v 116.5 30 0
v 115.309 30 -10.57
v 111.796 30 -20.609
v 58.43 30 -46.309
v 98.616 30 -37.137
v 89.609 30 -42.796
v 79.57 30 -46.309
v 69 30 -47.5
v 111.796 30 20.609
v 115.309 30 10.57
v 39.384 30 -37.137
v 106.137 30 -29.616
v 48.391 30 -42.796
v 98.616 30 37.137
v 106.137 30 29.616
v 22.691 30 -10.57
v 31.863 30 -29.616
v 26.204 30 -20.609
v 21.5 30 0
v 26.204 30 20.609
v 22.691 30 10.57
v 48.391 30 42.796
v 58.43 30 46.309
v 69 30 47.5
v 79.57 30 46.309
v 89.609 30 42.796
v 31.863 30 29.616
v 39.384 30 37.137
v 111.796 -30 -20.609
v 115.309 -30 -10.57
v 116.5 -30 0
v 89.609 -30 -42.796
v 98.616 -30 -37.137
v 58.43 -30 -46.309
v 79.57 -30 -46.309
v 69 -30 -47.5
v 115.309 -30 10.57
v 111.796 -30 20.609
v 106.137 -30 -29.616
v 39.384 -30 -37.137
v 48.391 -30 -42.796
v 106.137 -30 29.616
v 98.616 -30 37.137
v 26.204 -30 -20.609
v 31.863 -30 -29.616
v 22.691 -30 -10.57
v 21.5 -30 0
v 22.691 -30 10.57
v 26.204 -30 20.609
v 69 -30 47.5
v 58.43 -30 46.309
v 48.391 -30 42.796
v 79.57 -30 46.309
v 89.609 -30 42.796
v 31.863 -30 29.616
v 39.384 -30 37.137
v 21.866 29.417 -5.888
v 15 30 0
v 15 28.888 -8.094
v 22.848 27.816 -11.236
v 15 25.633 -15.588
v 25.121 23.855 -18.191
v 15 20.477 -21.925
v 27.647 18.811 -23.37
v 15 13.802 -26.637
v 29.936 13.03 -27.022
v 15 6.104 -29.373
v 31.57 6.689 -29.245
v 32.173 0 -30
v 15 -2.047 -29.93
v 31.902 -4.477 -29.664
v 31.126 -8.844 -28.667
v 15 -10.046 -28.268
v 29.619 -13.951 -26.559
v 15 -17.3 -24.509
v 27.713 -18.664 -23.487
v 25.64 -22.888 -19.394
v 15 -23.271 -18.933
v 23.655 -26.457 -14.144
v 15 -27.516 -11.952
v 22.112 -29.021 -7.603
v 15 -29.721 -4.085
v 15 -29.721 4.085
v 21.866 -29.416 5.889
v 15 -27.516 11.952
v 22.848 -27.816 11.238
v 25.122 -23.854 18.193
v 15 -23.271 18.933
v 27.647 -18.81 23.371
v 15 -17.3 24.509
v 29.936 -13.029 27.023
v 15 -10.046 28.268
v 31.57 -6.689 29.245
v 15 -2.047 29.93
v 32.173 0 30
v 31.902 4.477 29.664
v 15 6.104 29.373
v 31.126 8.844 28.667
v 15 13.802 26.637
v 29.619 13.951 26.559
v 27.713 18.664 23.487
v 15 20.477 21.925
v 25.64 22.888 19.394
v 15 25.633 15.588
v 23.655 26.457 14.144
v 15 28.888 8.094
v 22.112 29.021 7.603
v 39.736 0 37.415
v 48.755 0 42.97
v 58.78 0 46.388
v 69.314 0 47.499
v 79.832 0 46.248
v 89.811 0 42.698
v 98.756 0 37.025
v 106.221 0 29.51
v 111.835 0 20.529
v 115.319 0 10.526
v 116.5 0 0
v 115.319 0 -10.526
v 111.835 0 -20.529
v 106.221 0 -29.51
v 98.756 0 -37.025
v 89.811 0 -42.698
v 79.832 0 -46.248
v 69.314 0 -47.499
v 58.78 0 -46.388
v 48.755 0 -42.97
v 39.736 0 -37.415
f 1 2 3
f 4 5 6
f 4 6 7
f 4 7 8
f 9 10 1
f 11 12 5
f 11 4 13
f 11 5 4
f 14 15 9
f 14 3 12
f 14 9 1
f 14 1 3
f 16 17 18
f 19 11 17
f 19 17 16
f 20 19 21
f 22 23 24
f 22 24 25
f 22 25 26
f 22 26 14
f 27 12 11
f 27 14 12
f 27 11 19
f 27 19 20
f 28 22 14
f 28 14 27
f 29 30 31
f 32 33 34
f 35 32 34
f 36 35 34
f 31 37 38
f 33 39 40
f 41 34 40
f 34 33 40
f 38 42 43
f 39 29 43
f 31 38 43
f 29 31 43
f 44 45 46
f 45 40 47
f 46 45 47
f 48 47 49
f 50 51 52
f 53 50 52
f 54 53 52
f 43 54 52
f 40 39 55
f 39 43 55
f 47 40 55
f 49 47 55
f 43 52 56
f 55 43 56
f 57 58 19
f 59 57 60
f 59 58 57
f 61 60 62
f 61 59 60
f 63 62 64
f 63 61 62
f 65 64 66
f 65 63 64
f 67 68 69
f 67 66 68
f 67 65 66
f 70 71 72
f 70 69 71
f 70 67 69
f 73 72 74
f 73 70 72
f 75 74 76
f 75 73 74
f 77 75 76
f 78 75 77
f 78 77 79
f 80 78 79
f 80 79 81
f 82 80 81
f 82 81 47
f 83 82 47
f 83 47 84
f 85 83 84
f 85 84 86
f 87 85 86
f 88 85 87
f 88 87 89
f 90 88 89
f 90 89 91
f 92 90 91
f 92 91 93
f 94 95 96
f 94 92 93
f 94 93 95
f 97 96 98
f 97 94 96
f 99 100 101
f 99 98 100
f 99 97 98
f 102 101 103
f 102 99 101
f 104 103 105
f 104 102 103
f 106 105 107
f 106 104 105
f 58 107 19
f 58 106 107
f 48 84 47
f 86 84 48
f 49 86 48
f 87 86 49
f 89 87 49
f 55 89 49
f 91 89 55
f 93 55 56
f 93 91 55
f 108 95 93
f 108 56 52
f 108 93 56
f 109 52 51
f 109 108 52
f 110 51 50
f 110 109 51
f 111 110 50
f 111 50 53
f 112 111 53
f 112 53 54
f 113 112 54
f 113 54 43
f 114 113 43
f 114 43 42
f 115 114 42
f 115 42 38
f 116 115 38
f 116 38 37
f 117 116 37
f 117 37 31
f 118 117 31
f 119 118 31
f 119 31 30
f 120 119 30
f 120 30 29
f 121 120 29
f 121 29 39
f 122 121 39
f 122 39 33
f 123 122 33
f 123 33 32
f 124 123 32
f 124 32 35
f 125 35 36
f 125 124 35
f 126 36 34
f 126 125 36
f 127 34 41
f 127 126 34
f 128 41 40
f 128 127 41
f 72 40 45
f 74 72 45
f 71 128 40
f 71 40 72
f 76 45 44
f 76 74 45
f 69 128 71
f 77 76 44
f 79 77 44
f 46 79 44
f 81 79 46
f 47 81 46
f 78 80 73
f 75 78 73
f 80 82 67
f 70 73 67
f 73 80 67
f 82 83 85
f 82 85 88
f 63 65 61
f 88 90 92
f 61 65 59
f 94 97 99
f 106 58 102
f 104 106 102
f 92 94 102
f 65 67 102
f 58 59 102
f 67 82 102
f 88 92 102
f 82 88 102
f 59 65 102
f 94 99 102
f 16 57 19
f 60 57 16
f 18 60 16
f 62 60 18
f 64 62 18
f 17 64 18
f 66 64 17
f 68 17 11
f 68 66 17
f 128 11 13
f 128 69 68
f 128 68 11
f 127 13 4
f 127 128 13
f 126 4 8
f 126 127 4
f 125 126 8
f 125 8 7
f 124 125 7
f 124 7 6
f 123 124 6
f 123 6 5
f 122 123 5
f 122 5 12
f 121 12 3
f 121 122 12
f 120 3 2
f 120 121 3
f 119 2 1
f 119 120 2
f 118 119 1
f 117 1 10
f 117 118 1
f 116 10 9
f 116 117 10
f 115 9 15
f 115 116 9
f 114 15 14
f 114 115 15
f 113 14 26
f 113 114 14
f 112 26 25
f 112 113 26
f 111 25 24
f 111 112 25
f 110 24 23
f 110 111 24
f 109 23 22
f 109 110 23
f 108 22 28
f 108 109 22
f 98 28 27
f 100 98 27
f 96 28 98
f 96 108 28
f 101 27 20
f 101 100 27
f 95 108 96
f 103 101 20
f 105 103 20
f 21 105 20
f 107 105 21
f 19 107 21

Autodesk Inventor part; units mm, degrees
ref_plane "YZ Plane" through (0, 0, 0) normal (1, 0, 0) x (0, 1, 0)
ref_plane "XZ Plane" through (0, 0, 0) normal (0, 1, 0) x (-1, 0, 0)
ref_plane "XY Plane" through (0, 0, 0) normal (0, 0, 1) x (1, 0, 0)
sketch "Sketch1" plane through (0, 0, 0) normal (1, 0, 0) x (0, 1, 0)
  circle A0 centre (0, 0) radius 30
  dimension "d0" = 60
extrude "Extrusion1" add sketch "Sketch1" along normal blind 54
sketch "Sketch2" plane through (0, 0, 0) normal (0, 1, 0) x (-1, 0, 0)
  line L0 (-54, 30) -> (-54, -30) projected
  circle A0 centre (-54, 0) radius 47.5
  point P0 (0, 0)
  dimension "d3" = 95
extrude "Extrusion2" add sketch "Sketch2" along normal mid plane 60
move or copy body "Move Body1" bodies to move or copy 1 copy no translate (15, 0, 0)
properties part number "hip"
